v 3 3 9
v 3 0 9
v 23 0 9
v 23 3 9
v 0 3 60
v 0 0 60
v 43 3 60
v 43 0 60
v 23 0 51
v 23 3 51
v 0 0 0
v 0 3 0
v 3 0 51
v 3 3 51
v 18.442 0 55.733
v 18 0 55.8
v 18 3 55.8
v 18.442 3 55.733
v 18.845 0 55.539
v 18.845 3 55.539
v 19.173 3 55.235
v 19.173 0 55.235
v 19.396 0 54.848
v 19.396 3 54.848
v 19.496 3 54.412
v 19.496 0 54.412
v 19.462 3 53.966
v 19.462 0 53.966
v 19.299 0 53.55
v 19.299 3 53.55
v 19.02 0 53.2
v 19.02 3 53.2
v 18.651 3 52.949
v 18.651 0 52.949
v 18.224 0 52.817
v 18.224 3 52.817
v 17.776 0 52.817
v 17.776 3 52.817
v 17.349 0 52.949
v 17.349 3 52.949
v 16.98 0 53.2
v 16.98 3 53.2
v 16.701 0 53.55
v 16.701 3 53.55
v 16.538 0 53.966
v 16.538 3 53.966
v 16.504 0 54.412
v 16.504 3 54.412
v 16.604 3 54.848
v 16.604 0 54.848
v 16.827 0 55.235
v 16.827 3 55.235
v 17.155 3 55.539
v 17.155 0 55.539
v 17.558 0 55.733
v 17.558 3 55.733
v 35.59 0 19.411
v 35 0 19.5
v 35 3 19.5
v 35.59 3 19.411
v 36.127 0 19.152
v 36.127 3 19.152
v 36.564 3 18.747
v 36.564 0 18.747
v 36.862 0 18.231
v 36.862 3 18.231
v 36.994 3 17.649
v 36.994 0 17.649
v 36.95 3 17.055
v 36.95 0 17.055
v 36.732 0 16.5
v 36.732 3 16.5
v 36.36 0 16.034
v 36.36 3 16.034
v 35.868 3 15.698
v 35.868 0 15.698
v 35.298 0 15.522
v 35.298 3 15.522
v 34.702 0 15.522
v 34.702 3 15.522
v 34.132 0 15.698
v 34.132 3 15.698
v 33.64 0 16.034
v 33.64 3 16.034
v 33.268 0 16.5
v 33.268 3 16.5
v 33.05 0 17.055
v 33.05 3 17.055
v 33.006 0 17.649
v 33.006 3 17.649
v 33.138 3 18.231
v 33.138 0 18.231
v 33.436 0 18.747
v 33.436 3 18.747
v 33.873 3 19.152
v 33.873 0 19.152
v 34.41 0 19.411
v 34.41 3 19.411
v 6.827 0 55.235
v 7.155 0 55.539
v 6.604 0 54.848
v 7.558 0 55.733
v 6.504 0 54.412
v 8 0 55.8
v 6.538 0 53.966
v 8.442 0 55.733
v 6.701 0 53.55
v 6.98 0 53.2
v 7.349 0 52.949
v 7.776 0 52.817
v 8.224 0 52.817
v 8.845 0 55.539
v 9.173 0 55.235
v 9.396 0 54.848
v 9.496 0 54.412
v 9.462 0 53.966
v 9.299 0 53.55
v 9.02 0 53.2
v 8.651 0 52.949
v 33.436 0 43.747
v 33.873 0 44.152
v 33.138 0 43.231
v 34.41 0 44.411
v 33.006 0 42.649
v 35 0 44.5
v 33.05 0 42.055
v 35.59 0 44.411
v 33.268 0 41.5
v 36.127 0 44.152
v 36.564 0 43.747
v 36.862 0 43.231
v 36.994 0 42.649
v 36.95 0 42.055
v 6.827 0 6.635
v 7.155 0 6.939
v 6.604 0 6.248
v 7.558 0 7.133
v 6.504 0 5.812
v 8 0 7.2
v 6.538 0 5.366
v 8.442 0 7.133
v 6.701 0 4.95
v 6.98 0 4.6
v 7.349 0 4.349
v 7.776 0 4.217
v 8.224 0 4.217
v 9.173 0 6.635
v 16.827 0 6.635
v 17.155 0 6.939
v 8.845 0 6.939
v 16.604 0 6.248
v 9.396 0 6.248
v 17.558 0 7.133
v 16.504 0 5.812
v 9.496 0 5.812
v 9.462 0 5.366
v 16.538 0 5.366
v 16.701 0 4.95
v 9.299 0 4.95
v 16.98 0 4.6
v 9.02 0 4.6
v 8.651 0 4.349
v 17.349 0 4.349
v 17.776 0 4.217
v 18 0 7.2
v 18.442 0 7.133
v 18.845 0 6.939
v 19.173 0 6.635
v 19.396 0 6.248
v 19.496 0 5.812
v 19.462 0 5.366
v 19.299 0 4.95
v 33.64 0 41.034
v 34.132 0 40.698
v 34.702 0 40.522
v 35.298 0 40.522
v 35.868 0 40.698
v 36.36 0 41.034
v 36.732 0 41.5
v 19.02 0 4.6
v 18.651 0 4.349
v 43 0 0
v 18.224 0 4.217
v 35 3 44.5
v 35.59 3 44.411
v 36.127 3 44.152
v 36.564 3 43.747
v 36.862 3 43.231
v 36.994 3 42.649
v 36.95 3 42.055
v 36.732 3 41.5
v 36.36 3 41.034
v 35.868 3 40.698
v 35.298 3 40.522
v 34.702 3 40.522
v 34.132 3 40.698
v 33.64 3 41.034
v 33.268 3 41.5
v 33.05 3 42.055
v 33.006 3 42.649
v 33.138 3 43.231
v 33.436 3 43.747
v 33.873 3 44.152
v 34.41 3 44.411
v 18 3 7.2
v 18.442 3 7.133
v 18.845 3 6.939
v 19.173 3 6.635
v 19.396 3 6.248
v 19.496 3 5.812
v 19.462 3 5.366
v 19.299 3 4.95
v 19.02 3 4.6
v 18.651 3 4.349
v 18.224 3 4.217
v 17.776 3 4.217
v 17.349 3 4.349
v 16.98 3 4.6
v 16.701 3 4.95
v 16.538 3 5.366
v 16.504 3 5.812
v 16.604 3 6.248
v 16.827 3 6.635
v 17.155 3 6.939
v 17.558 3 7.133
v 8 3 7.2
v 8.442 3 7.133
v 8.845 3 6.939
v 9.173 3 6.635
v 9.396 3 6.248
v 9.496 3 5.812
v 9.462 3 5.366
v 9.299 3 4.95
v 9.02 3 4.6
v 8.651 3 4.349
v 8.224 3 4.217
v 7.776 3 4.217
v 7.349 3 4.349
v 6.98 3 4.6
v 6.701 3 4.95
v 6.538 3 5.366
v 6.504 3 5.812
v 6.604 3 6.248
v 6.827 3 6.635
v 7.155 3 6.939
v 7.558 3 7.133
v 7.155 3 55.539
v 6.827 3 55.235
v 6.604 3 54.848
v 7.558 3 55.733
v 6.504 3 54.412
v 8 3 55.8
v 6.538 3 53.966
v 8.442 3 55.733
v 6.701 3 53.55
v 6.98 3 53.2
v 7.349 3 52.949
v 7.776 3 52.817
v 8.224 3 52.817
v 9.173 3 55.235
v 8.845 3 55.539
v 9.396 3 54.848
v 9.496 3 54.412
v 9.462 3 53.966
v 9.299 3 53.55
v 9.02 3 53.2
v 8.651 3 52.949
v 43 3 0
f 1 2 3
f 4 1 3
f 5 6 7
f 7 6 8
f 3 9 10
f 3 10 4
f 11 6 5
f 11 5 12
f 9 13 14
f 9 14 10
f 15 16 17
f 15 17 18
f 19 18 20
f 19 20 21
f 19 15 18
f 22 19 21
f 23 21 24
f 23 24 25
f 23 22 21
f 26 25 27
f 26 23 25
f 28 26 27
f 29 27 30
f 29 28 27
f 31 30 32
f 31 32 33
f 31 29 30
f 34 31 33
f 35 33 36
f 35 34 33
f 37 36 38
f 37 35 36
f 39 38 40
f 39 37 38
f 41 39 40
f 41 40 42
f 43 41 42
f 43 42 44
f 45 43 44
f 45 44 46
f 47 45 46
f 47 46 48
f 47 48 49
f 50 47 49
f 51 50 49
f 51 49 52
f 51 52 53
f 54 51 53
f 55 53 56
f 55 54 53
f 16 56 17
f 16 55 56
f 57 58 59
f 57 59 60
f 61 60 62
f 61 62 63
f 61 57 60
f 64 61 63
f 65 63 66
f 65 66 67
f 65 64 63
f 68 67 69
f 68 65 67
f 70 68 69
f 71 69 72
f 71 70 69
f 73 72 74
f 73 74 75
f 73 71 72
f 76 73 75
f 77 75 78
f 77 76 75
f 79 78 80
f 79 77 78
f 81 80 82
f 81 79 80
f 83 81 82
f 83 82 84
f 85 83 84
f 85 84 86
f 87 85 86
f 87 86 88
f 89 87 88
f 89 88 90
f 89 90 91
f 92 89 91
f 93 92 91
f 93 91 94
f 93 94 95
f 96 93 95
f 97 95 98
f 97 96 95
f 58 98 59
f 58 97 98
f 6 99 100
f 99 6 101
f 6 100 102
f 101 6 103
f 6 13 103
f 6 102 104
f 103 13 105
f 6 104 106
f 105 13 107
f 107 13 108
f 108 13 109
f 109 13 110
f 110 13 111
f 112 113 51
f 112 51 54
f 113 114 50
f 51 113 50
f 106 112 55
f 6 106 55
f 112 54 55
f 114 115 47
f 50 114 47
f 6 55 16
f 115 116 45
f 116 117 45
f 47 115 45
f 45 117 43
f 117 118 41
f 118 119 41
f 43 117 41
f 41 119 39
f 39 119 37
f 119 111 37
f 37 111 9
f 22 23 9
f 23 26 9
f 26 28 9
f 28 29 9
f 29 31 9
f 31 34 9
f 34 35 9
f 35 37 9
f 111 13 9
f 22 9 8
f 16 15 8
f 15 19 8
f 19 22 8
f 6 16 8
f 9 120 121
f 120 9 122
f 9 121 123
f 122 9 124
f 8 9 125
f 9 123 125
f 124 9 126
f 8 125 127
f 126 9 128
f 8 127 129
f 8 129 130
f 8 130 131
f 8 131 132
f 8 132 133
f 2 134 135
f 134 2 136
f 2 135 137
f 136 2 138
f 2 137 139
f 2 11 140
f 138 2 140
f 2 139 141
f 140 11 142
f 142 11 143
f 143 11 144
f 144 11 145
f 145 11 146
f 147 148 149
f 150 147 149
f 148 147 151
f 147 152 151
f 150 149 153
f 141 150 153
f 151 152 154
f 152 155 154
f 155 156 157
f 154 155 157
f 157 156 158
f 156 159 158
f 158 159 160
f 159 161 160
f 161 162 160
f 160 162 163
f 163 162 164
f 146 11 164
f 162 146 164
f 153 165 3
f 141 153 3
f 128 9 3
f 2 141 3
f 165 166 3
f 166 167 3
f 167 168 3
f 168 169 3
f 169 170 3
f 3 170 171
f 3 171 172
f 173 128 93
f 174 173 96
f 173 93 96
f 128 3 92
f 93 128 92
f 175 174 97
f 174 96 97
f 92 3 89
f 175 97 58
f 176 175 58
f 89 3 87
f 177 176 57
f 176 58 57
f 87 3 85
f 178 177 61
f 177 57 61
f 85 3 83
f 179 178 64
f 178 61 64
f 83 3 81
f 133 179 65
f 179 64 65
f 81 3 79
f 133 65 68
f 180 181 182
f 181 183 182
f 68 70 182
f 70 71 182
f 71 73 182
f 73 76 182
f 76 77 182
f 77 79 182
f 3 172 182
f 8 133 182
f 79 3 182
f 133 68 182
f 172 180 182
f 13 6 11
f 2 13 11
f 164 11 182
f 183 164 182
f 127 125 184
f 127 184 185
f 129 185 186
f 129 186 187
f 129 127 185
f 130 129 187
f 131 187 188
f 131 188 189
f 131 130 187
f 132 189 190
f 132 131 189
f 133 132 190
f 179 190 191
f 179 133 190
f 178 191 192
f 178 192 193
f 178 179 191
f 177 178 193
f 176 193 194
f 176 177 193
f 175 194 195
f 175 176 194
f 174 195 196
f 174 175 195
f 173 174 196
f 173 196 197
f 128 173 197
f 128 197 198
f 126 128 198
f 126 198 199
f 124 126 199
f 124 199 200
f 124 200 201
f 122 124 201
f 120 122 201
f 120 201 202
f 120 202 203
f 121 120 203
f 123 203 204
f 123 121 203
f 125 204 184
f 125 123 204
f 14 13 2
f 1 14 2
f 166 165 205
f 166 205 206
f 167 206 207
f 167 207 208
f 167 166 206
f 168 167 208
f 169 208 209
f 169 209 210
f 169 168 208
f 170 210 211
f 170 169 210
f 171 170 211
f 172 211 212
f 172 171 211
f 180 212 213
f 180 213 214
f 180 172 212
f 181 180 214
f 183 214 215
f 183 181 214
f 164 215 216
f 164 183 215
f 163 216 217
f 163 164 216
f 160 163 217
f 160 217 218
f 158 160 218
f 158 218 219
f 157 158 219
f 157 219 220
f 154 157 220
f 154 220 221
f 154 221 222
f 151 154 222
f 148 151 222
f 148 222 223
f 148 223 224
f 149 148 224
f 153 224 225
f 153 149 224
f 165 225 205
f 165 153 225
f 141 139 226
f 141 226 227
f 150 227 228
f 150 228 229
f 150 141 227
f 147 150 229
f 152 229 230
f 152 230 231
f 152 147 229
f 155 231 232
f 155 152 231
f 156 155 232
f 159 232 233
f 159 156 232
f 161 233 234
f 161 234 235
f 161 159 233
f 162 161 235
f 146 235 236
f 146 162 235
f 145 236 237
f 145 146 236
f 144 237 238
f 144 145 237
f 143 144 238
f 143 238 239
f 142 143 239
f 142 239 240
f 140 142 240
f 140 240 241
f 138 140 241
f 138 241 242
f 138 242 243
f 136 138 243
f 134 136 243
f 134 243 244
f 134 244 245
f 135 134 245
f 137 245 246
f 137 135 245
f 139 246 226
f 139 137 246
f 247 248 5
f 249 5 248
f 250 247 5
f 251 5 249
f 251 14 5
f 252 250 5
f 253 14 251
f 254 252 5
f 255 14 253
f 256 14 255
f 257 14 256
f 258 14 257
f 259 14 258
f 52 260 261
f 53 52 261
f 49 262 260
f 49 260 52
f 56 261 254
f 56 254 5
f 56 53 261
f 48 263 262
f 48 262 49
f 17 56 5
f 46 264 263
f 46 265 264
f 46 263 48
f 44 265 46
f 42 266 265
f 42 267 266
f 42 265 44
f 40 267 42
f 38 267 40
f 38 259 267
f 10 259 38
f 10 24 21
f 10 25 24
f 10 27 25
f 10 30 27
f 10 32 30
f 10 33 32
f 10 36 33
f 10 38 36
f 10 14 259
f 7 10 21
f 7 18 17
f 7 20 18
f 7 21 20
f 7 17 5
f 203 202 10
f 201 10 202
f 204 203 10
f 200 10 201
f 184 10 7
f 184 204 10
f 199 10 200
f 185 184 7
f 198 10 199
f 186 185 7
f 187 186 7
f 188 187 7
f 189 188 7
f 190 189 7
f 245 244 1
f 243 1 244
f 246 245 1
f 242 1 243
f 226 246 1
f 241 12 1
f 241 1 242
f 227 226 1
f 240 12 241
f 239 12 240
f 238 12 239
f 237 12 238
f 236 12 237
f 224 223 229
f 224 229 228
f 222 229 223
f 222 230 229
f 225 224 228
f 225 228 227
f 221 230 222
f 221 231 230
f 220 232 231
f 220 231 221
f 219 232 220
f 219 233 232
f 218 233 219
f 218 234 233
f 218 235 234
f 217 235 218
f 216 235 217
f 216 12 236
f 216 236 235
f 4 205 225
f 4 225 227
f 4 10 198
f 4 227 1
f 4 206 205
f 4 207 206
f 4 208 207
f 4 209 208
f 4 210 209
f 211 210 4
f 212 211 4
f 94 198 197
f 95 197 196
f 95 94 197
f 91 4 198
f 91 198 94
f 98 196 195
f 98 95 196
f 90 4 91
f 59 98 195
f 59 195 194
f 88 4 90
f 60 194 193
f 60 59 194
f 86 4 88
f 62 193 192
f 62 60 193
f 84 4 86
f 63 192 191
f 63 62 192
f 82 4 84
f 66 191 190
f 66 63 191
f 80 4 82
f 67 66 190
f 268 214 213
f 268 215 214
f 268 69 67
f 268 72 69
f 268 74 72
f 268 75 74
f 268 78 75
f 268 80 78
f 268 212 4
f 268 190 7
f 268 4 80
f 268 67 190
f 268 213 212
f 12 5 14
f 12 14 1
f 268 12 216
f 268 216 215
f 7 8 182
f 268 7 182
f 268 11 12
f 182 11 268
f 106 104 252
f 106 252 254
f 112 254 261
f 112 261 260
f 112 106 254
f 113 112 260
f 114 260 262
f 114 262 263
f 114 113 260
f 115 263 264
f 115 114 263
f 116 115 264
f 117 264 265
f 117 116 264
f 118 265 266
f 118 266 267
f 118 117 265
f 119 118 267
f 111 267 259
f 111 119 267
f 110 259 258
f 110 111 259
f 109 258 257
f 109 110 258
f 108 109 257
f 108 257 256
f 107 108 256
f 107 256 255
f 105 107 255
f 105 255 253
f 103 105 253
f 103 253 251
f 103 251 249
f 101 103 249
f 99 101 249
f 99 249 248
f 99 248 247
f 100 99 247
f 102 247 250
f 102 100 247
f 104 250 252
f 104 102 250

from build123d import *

# Parameters (mm, degrees)
SKETCH_1_W      = 43
SKETCH_1_H      = 60
SKETCH_1_R      = 1.5
SKETCH_1_R_2    = 2
SKETCH_1_W_2    = 20
SKETCH_1_H_2    = 42
EXTRUDE_1_DEPTH = 3


with BuildPart() as part:
    # 草图1 → 凸台-拉伸1 (new body)
    with BuildSketch(Plane(origin=(0, 0, 0), x_dir=(1, 0, 0), z_dir=(0, 1, 0))):
        with Locations((21.5, -30)):
            Rectangle(SKETCH_1_W, SKETCH_1_H)
        with Locations(Location((8, -5.7, 0), (0, 0, 270))):
            Circle(SKETCH_1_R, mode=Mode.SUBTRACT)
        with Locations(Location((18, -5.7, 0), (0, 0, 270))):
            Circle(SKETCH_1_R, mode=Mode.SUBTRACT)
        with Locations(Location((8, -54.3, 0), (0, 0, 270))):
            Circle(SKETCH_1_R, mode=Mode.SUBTRACT)
        with Locations(Location((18, -54.3, 0), (0, 0, 270))):
            Circle(SKETCH_1_R, mode=Mode.SUBTRACT)
        with Locations(Location((35, -17.5, 0), (0, 0, 270))):
            Circle(SKETCH_1_R_2, mode=Mode.SUBTRACT)
        with Locations(Location((35, -42.5, 0), (0, 0, 270))):
            Circle(SKETCH_1_R_2, mode=Mode.SUBTRACT)
        with Locations((13, -30)):
            Rectangle(SKETCH_1_W_2, SKETCH_1_H_2, mode=Mode.SUBTRACT)
    extrude(amount=EXTRUDE_1_DEPTH)


solid = part.part
